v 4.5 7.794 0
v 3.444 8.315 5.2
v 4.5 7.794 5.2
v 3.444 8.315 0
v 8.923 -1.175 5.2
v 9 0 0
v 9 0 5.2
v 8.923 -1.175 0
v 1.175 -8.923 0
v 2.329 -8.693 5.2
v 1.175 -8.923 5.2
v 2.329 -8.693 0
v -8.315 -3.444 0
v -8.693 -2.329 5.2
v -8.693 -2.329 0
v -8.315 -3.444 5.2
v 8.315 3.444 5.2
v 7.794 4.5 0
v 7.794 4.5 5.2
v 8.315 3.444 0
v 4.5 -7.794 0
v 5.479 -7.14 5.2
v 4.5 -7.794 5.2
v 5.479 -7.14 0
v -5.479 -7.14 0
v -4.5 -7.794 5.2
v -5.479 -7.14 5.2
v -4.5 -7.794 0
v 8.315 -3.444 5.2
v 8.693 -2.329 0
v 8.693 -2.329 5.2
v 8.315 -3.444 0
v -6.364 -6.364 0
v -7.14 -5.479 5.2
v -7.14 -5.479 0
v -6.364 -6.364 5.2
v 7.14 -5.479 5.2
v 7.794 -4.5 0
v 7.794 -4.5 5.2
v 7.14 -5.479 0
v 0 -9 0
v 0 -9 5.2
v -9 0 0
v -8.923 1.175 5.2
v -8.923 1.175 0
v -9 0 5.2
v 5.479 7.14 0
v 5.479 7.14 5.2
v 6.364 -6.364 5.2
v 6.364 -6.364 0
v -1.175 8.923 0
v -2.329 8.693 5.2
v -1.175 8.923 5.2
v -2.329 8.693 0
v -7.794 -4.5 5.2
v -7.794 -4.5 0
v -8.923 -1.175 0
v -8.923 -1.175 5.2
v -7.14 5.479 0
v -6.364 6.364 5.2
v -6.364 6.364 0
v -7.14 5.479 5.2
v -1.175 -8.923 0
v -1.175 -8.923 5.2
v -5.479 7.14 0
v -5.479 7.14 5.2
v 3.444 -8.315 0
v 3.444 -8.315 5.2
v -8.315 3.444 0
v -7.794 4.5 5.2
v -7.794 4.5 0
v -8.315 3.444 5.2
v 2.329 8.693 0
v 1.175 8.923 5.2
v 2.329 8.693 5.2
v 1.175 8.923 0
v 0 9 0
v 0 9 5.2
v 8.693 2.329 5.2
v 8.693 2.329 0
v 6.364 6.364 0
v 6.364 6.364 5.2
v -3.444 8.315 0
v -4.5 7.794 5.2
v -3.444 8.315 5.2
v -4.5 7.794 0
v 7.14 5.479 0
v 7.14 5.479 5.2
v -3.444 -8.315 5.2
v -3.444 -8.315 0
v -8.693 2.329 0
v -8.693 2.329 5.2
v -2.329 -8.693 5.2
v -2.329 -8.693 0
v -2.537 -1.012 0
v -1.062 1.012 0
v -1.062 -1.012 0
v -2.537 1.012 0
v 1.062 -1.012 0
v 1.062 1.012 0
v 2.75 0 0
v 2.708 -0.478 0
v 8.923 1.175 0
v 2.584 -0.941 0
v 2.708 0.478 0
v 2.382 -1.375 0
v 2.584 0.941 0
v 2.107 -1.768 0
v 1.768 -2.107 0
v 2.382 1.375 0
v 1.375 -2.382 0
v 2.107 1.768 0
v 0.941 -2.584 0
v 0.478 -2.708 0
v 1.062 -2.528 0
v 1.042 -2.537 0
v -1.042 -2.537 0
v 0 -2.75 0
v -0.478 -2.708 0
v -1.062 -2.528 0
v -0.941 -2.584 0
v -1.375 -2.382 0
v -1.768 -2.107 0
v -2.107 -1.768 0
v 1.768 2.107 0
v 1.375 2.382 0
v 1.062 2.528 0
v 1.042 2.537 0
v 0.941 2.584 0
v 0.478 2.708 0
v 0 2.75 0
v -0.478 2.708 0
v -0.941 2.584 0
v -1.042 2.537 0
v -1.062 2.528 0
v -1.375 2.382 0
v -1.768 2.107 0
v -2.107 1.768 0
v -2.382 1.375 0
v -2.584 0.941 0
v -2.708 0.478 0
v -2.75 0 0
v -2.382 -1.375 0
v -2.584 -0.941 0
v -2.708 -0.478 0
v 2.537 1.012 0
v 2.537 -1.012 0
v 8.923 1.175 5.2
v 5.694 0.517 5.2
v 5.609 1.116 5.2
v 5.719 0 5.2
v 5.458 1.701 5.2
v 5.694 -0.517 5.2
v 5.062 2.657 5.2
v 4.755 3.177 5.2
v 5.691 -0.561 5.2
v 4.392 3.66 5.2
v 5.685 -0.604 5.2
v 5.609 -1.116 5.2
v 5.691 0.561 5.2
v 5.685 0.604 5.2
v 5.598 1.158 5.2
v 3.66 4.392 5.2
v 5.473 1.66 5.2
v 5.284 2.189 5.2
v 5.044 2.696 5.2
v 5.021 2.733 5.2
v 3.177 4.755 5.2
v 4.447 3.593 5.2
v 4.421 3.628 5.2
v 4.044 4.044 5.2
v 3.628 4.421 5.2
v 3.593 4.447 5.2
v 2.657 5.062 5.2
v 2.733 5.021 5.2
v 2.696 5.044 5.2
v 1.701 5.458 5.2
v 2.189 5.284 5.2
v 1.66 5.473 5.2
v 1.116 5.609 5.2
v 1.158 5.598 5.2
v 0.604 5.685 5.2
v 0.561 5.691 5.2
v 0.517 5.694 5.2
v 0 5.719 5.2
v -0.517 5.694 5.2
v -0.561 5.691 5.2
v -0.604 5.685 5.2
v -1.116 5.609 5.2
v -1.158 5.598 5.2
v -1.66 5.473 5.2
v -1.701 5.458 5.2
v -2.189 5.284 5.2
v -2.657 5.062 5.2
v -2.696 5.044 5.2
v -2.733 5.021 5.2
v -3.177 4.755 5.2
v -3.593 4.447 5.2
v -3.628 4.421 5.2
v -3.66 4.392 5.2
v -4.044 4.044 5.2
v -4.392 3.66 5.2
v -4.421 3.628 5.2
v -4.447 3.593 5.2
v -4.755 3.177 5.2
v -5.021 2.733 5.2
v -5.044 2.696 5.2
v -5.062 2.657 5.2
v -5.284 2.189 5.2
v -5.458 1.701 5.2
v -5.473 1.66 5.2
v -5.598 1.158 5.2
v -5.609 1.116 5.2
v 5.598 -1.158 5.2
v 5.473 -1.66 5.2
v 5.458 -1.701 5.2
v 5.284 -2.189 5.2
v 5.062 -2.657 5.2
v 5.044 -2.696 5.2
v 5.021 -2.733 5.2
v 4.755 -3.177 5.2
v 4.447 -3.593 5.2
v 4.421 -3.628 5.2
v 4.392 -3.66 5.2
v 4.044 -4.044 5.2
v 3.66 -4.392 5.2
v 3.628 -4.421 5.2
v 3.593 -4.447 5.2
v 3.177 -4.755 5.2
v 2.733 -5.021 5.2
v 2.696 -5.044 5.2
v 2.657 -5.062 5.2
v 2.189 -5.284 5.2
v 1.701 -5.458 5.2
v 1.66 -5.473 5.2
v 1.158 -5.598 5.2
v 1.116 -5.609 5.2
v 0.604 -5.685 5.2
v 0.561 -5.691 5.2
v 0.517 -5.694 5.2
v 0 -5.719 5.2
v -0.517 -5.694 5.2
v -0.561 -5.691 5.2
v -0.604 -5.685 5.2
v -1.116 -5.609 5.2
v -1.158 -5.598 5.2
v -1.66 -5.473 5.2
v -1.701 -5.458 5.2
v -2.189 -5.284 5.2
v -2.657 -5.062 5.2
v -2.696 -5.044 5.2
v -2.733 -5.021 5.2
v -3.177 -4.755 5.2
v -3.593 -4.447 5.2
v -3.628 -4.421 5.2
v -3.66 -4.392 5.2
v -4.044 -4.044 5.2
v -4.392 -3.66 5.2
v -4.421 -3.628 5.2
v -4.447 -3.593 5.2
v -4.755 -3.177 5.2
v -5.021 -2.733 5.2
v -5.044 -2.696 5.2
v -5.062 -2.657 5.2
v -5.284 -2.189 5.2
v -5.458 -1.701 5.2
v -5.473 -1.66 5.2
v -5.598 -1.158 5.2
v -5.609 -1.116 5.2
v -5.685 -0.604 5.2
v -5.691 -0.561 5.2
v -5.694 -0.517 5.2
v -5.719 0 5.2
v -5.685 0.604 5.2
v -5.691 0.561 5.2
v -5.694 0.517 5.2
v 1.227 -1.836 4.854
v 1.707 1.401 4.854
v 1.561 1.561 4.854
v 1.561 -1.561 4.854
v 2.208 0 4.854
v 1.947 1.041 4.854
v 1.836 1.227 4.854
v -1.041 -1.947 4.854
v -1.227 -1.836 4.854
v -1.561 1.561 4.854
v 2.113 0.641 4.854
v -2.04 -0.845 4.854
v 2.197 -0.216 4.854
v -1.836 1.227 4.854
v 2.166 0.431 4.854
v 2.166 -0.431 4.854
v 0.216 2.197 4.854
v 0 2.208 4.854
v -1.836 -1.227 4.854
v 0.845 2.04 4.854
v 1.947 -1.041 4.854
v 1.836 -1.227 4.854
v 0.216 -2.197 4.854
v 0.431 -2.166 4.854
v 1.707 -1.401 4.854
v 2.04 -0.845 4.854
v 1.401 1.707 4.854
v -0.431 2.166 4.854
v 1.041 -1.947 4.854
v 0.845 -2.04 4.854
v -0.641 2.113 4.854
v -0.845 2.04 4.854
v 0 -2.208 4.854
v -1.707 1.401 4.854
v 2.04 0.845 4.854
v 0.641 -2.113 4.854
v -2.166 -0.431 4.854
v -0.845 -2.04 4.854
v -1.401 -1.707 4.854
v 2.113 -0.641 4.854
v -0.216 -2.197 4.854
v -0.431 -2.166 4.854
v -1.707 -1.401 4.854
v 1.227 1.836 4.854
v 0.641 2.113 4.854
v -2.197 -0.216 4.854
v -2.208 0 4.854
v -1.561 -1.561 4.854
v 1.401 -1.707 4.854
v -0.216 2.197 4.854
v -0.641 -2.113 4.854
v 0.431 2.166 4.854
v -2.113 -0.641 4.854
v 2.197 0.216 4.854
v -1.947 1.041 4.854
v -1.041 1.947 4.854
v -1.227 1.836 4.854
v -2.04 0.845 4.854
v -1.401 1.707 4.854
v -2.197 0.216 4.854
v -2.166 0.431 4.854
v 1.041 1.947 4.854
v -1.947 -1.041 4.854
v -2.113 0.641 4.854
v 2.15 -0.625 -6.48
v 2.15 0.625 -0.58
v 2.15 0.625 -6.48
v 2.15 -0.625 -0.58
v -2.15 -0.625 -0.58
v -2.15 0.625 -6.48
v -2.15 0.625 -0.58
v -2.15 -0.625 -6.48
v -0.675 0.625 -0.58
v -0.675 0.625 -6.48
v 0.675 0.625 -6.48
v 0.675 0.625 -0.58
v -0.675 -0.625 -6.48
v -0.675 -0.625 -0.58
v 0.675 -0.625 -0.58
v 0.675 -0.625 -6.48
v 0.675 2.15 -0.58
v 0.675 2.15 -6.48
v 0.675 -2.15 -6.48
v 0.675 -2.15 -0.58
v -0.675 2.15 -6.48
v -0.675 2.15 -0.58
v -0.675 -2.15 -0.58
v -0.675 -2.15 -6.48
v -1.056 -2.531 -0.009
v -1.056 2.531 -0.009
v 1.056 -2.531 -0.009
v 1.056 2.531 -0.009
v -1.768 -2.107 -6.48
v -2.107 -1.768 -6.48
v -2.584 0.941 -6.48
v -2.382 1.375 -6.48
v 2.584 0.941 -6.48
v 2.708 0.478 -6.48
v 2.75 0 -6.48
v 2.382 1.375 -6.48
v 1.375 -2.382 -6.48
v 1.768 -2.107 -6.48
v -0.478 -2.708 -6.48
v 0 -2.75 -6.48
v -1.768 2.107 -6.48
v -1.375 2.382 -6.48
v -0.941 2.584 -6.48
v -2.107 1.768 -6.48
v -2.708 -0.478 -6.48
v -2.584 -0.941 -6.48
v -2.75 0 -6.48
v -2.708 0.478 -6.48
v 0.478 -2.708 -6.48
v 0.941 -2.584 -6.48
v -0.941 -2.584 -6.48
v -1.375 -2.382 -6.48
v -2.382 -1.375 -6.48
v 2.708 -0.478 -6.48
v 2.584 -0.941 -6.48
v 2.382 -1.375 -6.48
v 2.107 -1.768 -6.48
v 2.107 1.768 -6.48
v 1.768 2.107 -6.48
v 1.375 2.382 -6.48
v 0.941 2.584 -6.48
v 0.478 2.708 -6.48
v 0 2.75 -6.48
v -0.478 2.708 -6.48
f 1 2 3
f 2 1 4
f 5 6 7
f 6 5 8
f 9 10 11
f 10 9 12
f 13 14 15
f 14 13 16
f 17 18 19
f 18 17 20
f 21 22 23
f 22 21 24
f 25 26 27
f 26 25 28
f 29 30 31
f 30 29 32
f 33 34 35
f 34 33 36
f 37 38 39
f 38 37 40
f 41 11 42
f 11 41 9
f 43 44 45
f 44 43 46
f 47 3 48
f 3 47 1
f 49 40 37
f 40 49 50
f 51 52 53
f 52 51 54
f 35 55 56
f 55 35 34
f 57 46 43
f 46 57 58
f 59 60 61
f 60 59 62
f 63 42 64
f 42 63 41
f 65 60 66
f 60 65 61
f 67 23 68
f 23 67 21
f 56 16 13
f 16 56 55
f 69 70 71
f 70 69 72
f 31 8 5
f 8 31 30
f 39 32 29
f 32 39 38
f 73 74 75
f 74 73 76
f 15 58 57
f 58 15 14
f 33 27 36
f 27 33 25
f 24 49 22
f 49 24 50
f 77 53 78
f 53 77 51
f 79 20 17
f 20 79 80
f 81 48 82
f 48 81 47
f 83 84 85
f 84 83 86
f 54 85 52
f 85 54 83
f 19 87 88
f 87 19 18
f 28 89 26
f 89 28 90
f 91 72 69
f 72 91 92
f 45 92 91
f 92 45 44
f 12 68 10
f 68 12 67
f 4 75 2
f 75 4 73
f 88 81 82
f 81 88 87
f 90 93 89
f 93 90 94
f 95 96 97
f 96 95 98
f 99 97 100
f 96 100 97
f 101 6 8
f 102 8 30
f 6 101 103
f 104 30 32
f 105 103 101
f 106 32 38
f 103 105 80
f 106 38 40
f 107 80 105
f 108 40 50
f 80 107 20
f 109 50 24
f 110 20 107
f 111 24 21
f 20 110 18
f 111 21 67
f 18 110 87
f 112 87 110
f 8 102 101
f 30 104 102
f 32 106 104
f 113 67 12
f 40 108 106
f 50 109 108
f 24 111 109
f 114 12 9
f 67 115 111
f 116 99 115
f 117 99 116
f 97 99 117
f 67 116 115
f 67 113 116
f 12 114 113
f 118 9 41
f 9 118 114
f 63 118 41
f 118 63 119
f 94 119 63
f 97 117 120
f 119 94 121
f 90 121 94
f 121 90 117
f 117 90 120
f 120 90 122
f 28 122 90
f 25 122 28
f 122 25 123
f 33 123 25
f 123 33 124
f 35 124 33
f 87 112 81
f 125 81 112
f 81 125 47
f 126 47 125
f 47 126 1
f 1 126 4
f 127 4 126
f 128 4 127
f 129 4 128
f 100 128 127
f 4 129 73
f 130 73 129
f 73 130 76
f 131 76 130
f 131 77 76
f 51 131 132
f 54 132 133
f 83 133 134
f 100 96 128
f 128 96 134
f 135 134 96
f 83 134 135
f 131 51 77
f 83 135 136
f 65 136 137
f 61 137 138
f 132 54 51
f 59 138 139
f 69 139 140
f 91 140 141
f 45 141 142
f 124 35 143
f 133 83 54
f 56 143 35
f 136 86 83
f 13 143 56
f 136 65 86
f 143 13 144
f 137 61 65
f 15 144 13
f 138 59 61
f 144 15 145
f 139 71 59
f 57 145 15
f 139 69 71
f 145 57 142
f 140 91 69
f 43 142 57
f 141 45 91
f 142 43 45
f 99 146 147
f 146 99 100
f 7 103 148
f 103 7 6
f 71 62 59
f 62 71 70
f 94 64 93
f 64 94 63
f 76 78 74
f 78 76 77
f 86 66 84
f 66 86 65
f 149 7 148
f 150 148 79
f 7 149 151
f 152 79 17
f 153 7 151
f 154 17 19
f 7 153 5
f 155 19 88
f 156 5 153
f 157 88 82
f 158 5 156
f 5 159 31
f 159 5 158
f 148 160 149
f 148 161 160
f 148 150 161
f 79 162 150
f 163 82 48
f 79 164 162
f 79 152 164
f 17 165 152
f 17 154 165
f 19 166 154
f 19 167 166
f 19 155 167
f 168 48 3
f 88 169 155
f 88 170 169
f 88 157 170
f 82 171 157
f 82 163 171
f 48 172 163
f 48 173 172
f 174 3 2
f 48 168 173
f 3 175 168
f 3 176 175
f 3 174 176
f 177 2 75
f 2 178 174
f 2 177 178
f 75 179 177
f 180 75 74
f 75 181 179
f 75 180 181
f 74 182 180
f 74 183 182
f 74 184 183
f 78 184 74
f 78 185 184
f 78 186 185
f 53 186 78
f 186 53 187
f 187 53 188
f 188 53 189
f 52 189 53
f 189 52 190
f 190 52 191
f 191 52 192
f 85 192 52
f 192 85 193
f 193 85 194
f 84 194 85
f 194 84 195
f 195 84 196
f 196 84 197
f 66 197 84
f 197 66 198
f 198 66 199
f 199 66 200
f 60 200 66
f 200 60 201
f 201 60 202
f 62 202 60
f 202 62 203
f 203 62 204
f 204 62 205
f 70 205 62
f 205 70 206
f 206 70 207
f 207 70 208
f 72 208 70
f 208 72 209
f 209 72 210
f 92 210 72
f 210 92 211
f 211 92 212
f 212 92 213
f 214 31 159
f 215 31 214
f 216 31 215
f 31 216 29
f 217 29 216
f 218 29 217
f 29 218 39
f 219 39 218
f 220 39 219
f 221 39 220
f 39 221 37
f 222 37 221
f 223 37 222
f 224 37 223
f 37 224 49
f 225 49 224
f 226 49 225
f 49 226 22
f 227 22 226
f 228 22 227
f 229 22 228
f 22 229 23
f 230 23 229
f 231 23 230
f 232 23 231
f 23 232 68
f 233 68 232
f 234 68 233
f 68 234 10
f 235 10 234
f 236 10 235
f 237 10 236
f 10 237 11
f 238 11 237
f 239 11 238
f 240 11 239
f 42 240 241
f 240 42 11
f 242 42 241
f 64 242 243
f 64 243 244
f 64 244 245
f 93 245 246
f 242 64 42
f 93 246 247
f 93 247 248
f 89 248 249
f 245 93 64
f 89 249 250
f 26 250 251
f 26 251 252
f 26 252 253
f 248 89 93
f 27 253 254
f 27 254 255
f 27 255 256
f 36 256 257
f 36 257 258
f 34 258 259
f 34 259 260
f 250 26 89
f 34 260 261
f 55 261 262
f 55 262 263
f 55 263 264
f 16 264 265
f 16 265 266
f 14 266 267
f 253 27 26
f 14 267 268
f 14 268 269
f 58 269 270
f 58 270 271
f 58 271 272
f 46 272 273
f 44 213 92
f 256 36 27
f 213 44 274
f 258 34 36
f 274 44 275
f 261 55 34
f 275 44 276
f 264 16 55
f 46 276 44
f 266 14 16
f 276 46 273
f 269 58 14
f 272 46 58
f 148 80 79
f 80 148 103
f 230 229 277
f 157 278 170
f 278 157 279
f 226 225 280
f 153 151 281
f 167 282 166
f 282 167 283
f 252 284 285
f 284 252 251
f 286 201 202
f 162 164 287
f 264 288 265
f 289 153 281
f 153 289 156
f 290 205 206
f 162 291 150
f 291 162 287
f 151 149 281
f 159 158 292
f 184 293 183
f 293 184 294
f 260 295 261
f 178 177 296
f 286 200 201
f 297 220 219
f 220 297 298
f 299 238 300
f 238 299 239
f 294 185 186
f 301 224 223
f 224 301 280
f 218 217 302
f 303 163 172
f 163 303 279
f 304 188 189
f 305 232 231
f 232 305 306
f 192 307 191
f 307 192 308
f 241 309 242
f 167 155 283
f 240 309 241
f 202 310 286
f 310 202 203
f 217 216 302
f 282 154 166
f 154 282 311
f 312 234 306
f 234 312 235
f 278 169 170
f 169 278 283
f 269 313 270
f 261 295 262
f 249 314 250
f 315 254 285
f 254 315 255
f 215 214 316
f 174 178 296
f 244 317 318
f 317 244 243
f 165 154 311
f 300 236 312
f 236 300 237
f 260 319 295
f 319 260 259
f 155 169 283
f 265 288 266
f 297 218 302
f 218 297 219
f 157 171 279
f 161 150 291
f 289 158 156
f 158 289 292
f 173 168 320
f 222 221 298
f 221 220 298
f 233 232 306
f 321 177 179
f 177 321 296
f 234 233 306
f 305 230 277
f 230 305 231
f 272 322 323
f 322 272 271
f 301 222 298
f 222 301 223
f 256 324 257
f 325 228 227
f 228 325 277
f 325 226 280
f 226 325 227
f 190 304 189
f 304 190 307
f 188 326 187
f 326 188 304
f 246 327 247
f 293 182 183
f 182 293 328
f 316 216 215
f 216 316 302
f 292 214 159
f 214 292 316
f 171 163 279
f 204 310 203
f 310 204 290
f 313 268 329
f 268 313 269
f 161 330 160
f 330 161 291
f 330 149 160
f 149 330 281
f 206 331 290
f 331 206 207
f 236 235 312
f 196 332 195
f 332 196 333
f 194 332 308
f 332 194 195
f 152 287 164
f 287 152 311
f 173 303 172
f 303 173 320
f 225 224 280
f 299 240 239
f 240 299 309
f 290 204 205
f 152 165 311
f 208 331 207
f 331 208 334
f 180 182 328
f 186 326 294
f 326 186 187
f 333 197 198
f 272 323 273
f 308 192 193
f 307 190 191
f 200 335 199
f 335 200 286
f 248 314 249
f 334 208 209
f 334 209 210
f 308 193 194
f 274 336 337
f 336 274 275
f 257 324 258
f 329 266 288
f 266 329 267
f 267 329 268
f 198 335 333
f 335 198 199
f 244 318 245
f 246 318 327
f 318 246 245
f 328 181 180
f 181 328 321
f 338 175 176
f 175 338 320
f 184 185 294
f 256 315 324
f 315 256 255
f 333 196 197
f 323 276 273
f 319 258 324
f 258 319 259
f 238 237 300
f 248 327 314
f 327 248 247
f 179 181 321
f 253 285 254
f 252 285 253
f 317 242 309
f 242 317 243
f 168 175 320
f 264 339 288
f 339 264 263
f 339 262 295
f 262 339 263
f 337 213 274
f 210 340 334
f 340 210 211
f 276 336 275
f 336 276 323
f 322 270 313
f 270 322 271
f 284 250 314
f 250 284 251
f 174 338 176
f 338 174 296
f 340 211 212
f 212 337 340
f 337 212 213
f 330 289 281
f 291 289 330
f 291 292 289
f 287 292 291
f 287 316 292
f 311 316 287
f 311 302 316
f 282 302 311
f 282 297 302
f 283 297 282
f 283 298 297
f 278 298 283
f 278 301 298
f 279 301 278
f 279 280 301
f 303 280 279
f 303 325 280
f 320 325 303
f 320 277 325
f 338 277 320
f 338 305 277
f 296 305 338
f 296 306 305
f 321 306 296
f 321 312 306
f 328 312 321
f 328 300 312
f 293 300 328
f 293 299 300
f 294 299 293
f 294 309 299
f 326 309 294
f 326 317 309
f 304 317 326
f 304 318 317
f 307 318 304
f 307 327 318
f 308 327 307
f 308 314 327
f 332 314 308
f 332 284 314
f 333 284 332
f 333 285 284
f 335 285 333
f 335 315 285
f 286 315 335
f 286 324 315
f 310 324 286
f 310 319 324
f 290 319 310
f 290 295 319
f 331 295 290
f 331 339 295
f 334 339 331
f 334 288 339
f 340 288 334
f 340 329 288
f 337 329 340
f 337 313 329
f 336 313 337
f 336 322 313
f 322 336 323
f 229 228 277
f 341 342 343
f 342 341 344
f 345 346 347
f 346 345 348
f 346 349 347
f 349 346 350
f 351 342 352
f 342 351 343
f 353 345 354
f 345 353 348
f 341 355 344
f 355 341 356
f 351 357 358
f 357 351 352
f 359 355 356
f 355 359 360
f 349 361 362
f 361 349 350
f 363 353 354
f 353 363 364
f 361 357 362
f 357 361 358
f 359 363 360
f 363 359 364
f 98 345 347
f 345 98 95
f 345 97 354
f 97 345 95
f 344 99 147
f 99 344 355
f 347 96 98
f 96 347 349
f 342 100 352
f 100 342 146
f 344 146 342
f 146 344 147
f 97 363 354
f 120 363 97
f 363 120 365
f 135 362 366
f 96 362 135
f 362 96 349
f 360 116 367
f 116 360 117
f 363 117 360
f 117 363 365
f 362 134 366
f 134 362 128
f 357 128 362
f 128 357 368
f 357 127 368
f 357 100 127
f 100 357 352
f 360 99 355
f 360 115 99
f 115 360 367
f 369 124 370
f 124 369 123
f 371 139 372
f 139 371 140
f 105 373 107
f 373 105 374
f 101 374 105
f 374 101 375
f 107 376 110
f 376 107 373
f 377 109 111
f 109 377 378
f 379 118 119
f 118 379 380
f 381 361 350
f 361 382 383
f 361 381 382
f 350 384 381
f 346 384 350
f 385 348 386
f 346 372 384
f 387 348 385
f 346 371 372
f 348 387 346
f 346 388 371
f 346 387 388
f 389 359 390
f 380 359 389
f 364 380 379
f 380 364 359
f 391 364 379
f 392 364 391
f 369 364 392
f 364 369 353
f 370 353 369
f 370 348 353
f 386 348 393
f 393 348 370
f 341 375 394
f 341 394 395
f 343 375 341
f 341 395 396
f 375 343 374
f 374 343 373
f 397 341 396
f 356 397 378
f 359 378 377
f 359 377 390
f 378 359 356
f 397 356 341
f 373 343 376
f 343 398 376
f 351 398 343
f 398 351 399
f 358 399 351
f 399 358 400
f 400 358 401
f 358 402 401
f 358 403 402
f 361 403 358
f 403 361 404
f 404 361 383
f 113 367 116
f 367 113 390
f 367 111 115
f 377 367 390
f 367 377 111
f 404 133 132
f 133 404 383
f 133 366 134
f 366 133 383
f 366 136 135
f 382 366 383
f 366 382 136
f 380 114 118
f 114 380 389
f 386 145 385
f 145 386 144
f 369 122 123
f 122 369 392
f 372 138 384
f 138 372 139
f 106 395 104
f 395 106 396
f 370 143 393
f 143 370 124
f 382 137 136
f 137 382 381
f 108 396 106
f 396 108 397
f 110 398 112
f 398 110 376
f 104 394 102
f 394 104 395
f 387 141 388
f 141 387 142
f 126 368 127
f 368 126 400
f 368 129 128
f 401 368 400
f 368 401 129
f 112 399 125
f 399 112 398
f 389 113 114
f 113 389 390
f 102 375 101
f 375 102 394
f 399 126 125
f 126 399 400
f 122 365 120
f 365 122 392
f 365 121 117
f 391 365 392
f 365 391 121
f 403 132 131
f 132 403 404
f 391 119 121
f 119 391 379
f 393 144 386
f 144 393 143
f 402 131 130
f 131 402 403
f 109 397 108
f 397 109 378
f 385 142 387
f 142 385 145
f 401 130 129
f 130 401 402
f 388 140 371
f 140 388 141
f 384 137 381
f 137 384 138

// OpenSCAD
// file: ../modules/homing_bar.scad
function homing_bar_curve_steps(
    diameter,
    quality = "export",
    preview_angle = 12,
    export_angle = 6,
    preview_chord = 0.5,
    export_chord = 0.25,
    minimum_steps = 18,
    preview_max_steps = 30,
    export_max_steps = 60
) =
    let(
        safe_radius = max(diameter / 2, 0.01),
        max_angle = quality == "preview" ? preview_angle : export_angle,
        max_chord = quality == "preview" ? preview_chord : export_chord,
        max_steps = quality == "preview" ? preview_max_steps : export_max_steps,
        angle_steps = ceil(360 / max(max_angle, 0.1)),
        chord_steps = ceil(2 * PI * safe_radius / max(max_chord, 0.01))
    )
    min(max(max(angle_steps, chord_steps), minimum_steps), max_steps);

module homing_bar_profile(length, width, quality = "export") {
    end_steps = homing_bar_curve_steps(width, quality);
    cap_length = max(length, width);

    hull() {
        translate([-cap_length / 2 + width / 2, 0])
            circle(d = width, $fn = end_steps);
        translate([ cap_length / 2 - width / 2, 0])
            circle(d = width, $fn = end_steps);
    }
}

module homing_bar_blank(
    length,
    width,
    height,
    base_thickness,
    offset_y,
    base_z,
    quality = "export"
) {
    cap_height = max(height, 0.05);
    contact_height = max(base_thickness, 0.05);
    contact_length = length + contact_height * 1.6;
    contact_width = width + contact_height * 1.2;

    translate([0, offset_y, base_z])
        union() {
            hull() {
                linear_extrude(height = 0.01)
                    homing_bar_profile(contact_length, contact_width, quality);
                translate([0, 0, contact_height])
                    linear_extrude(height = 0.01)
                        homing_bar_profile(length, width, quality);
            }

            translate([0, 0, contact_height])
                linear_extrude(height = cap_height)
                    homing_bar_profile(length, width, quality);
        }
}
// file: ../modules/stem_alps.scad
function positive_alps_stem_dimension(value, minimum = 0.1) = max(value, minimum);

module alps_post(stem_length, stem_width, stem_height, lead_in) {
    safe_length = positive_alps_stem_dimension(stem_length);
    safe_width = positive_alps_stem_dimension(stem_width);
    safe_height = max(stem_height, 0.2);
    safe_lead_in = min(lead_in, safe_length * 0.2, safe_width * 0.3, safe_height * 0.4);

    hull() {
        linear_extrude(height = max(safe_height - safe_lead_in, 0.01))
            square([safe_length, safe_width], center = true);

        translate([0, 0, safe_height - 0.01])
            linear_extrude(height = 0.01)
                square([
                    positive_alps_stem_dimension(safe_length - safe_lead_in * 2),
                    positive_alps_stem_dimension(safe_width - safe_lead_in * 2)
                ], center = true);
    }
}

module stem_alps(
    stem_length = 4.45,
    stem_width = 2.25,
    stem_height = 3.5,
    base_clearance = 0,
    lead_in = 0.12,
    quality = "export"
) {
    translate([0, 0, base_clearance])
        alps_post(stem_length, stem_width, stem_height, lead_in);
}
// file: ../modules/stem_choc_v2.scad
use <stem_mx.scad>

module stem_choc_v2(
    outer_diameter = 5.5,
    stem_height = 6.5,
    base_clearance = 0,
    cross_width_horizontal = 1.25,
    cross_length_horizontal = 4.3,
    cross_width_vertical = 1.35,
    cross_length_vertical = 4.3,
    cross_chamfer = 0.4,
    chamfer_height = 0.6,
    quality = "export"
) {
    stem_mx(
        outer_diameter = outer_diameter,
        stem_height = stem_height,
        base_clearance = base_clearance,
        cross_width_horizontal = cross_width_horizontal,
        cross_length_horizontal = cross_length_horizontal,
        cross_width_vertical = cross_width_vertical,
        cross_length_vertical = cross_length_vertical,
        cross_chamfer = cross_chamfer,
        chamfer_height = chamfer_height,
        quality = quality
    );
}
// file: ../modules/stem_choc_v1.scad
function positive_choc_stem_dimension(value, minimum = 0.1) = max(value, minimum);

module choc_v1_prong(prong_width, prong_depth, prong_height, lead_in) {
    safe_width = positive_choc_stem_dimension(prong_width);
    safe_depth = positive_choc_stem_dimension(prong_depth);
    safe_height = max(prong_height, 0.2);
    safe_lead_in = min(lead_in, safe_width * 0.4, safe_depth * 0.2, safe_height * 0.4);

    hull() {
        linear_extrude(height = max(safe_height - safe_lead_in, 0.01))
            square([safe_width, safe_depth], center = true);

        translate([0, 0, safe_height - 0.01])
            linear_extrude(height = 0.01)
                square([
                    positive_choc_stem_dimension(safe_width - safe_lead_in * 2),
                    positive_choc_stem_dimension(safe_depth - safe_lead_in * 2)
                ], center = true);
    }
}

module stem_choc_v1(
    prong_width = 1.2,
    prong_depth = 3.0,
    prong_spacing = 5.7,
    stem_height = 3.0,
    base_clearance = 0,
    lead_in = 0.12,
    quality = "export"
) {
    for (offset_x = [prong_spacing / 2, -prong_spacing / 2]) {
        translate([offset_x, 0, base_clearance])
            choc_v1_prong(prong_width, prong_depth, stem_height, lead_in);
    }
}
// file: ../modules/stem_mx.scad
function stem_curve_steps(
    diameter,
    quality = "export",
    preview_angle = 10,
    export_angle = 5,
    preview_chord = 0.6,
    export_chord = 0.25,
    minimum_steps = 24,
    preview_max_steps = 48,
    export_max_steps = 96
) =
    let(
        safe_radius = max(diameter / 2, 0.01),
        max_angle = quality == "preview" ? preview_angle : export_angle,
        max_chord = quality == "preview" ? preview_chord : export_chord,
        max_steps = quality == "preview" ? preview_max_steps : export_max_steps,
        angle_steps = ceil(360 / max(max_angle, 0.1)),
        chord_steps = ceil(2 * PI * safe_radius / max(max_chord, 0.01))
    )
    min(max(max(angle_steps, chord_steps), minimum_steps), max_steps);

module stem_slot(length, width, height) {
    translate([-length / 2, -width / 2, 0])
        cube([length, width, height]);
}

module stem_mx(
    outer_diameter = 5.5,
    stem_height = 4.5,
    base_clearance = 0,
    cross_width_horizontal = 1.25,
    cross_length_horizontal = 4.3,
    cross_width_vertical = 1.35,
    cross_length_vertical = 4.3,
    cross_chamfer = 0.4,
    chamfer_height = 0.6,
    quality = "export"
) {
    outer_steps = stem_curve_steps(outer_diameter, quality);
    safe_height = max(stem_height, 0.2);

    difference() {
        translate([0, 0, base_clearance])
            cylinder(d = outer_diameter, h = safe_height, $fn = outer_steps);

        translate([0, 0, base_clearance]) {
            stem_slot(cross_length_horizontal, cross_width_horizontal, safe_height + 1);
            stem_slot(cross_width_vertical, cross_length_vertical, safe_height + 1);
        }

        if (cross_chamfer > 0) {
            translate([0, 0, base_clearance - 0.01])
                hull() {
                    stem_slot(
                        cross_length_horizontal + cross_chamfer * 2,
                        cross_width_horizontal + cross_chamfer * 2,
                        0.01
                    );
                    translate([0, 0, chamfer_height])
                        stem_slot(cross_length_horizontal, cross_width_horizontal, 0.01);
                }

            translate([0, 0, base_clearance - 0.01])
                hull() {
                    stem_slot(
                        cross_width_vertical + cross_chamfer * 2,
                        cross_length_vertical + cross_chamfer * 2,
                        0.01
                    );
                    translate([0, 0, chamfer_height])
                        stem_slot(cross_width_vertical, cross_length_vertical, 0.01);
                }
        }
    }
}
// file: ../modules/legend_block.scad
function legend_quality_steps(quality, preview_steps, export_steps) =
    quality == "preview" ? preview_steps : export_steps;
function legend_text_curve_steps(quality = "export") =
    legend_quality_steps(quality, 48, 96);
function legend_text_internal_scale(quality = "export") =
    legend_quality_steps(quality, 6, 10);
// Keep legend size tied to the user's explicit control value without auto-fitting by label length.
function legend_text_size(depth) = max(depth, 0);

module legend_text_shape(label, size, font_name, curve_steps = 48) {
    text(
        text = label,
        size = size,
        font = font_name,
        halign = "center",
        valign = "center",
        $fn = curve_steps
    );
}

// Keep decoration options available across bundled fonts without requiring extra font files.
module legend_text_profile(
    label,
    size,
    font_name,
    outline_delta = 0,
    curve_steps = 48
) {
    if (abs(outline_delta) > 0.0001) {
        offset(delta = outline_delta)
            legend_text_shape(
                label = label,
                size = size,
                font_name = font_name,
                curve_steps = curve_steps
            );
    } else {
        legend_text_shape(
            label = label,
            size = size,
            font_name = font_name,
            curve_steps = curve_steps
        );
    }
}

module legend_block(
    label,
    width,
    depth,
    height,
    offset_x,
    offset_y,
    base_z,
    font_name = "M PLUS 1:style=Regular",
    underline_enabled = false,
    underline_width = 0,
    underline_thickness = 0,
    underline_offset_y = 0,
    outline_delta = 0,
    quality = "export"
) {
    if (!is_undef(label) && len(label) > 0) {
        size = legend_text_size(depth);
        curve_steps = legend_text_curve_steps(quality);
        internal_scale = legend_text_internal_scale(quality);

        translate([offset_x, offset_y, base_z])
            linear_extrude(height = height, center = false, convexity = 10)
                // Build glyph outlines at a larger internal scale so the bundled runtime
                // preserves more of the original font curvature before scaling back down.
                scale([1 / internal_scale, 1 / internal_scale, 1])
                    union() {
                        legend_text_profile(
                            label = label,
                            size = size * internal_scale,
                            font_name = font_name,
                            outline_delta = outline_delta * internal_scale,
                            curve_steps = curve_steps
                        );

                        if (underline_enabled && underline_width > 0 && underline_thickness > 0) {
                            translate([0, underline_offset_y * internal_scale])
                                square(
                                    [underline_width * internal_scale, underline_thickness * internal_scale],
                                    center = true
                                );
                        }
                    }
    }
}
// file: ../presets/stem-nominals.scad
stem_nominal_outer_diameter = 5.5;
legacy_stem_nominal_width = stem_nominal_outer_diameter;
legacy_stem_nominal_depth = stem_nominal_outer_diameter;
stem_nominal_height = 6.5;
stem_nominal_inset = 0;
stem_nominal_cross_width_horizontal = 1.25;
stem_nominal_cross_length_horizontal = 4.3;
stem_nominal_cross_width_vertical = 1.35;
stem_nominal_cross_length_vertical = 4.3;
stem_nominal_cross_chamfer = 0.4;

stem_mx_nominal_outer_diameter = 5.5;
stem_mx_nominal_height = 4.5;
stem_mx_nominal_inset = 0;
stem_mx_nominal_cross_width_horizontal = stem_nominal_cross_width_horizontal;
stem_mx_nominal_cross_length_horizontal = stem_nominal_cross_length_horizontal;
stem_mx_nominal_cross_width_vertical = stem_nominal_cross_width_vertical;
stem_mx_nominal_cross_length_vertical = stem_nominal_cross_length_vertical;
stem_mx_nominal_cross_chamfer = stem_nominal_cross_chamfer;

stem_choc_v2_nominal_outer_diameter = stem_nominal_outer_diameter;
stem_choc_v2_nominal_height = stem_nominal_height;
stem_choc_v2_nominal_inset = stem_nominal_inset;
stem_choc_v2_nominal_cross_width_horizontal = stem_nominal_cross_width_horizontal;
stem_choc_v2_nominal_cross_length_horizontal = stem_nominal_cross_length_horizontal;
stem_choc_v2_nominal_cross_width_vertical = stem_nominal_cross_width_vertical;
stem_choc_v2_nominal_cross_length_vertical = stem_nominal_cross_length_vertical;
stem_choc_v2_nominal_cross_chamfer = stem_nominal_cross_chamfer;

stem_choc_v1_nominal_height = 3.0;
stem_choc_v1_nominal_inset = 0;
stem_choc_v1_nominal_prong_width = 1.2;
stem_choc_v1_nominal_prong_depth = 3.0;
stem_choc_v1_nominal_prong_spacing = 5.7;
stem_choc_v1_nominal_lead_in = 0.12;

stem_alps_nominal_height = 3.5;
stem_alps_nominal_inset = 0;
stem_alps_nominal_length = 4.45;
stem_alps_nominal_width = 2.25;
stem_alps_nominal_lead_in = 0.12;
// file: common/typewriter-params.scad
user_shape_geometry_type = "typewriter";
user_key_width = 18;
user_key_depth = 18;
user_top_center_height = 5.2;
user_wall_thickness = 1.1;
user_top_scale = 1;
user_typewriter_corner_radius = 9;
user_profile_front_angle = 0;
user_profile_back_angle = 0;
user_profile_left_angle = 0;
user_profile_right_angle = 0;
user_top_thickness = 1.2;
user_bottom_corner_radius = 0;
user_top_corner_radius = 0;
user_top_shape_type = "flat";
user_dish_radius = 45;
user_dish_depth = 0;
user_top_pitch_deg = 0;
user_top_roll_deg = 0;
user_rim_enabled = false;
user_rim_width = 0;
user_rim_height_up = 0;
user_rim_height_down = 0;

user_legend_enabled = true;
user_legend_text = "A";
user_legend_font_name = "M PLUS 1:style=Regular";
user_legend_underline_enabled = false;
user_legend_underline_width = 0;
user_legend_underline_thickness = 0;
user_legend_underline_offset_y = 0;
user_legend_width = 7.2;
user_legend_depth = 4.0;
user_legend_height = 0;
user_legend_embed = 0.6;
user_legend_outline_delta = 0;
user_legend_offset_x = 0;
user_legend_offset_y = 0;

user_homing_bar_enabled = false;
user_homing_bar_height = 0.6;
user_homing_bar_length = 4.0;
user_homing_bar_width = 1.58;
user_homing_bar_offset_y = -3.5;
user_homing_bar_base_thickness = 0.35;

user_stem_type = "choc_v2";
user_stem_enabled = true;
user_stem_outer_delta = 0;
user_stem_cross_margin = 0;
user_stem_inset_delta = 0;
// main file
export_target = "preview";

include <common/typewriter-params.scad>

user_legend_enabled = false;
user_top_shape_type = "spherical";
user_dish_depth = 0.4;
user_rim_enabled = true;
user_rim_width = 1.2;
user_rim_height_up = 0;
user_rim_height_down = 0;

include <../base/keycap.scad>
